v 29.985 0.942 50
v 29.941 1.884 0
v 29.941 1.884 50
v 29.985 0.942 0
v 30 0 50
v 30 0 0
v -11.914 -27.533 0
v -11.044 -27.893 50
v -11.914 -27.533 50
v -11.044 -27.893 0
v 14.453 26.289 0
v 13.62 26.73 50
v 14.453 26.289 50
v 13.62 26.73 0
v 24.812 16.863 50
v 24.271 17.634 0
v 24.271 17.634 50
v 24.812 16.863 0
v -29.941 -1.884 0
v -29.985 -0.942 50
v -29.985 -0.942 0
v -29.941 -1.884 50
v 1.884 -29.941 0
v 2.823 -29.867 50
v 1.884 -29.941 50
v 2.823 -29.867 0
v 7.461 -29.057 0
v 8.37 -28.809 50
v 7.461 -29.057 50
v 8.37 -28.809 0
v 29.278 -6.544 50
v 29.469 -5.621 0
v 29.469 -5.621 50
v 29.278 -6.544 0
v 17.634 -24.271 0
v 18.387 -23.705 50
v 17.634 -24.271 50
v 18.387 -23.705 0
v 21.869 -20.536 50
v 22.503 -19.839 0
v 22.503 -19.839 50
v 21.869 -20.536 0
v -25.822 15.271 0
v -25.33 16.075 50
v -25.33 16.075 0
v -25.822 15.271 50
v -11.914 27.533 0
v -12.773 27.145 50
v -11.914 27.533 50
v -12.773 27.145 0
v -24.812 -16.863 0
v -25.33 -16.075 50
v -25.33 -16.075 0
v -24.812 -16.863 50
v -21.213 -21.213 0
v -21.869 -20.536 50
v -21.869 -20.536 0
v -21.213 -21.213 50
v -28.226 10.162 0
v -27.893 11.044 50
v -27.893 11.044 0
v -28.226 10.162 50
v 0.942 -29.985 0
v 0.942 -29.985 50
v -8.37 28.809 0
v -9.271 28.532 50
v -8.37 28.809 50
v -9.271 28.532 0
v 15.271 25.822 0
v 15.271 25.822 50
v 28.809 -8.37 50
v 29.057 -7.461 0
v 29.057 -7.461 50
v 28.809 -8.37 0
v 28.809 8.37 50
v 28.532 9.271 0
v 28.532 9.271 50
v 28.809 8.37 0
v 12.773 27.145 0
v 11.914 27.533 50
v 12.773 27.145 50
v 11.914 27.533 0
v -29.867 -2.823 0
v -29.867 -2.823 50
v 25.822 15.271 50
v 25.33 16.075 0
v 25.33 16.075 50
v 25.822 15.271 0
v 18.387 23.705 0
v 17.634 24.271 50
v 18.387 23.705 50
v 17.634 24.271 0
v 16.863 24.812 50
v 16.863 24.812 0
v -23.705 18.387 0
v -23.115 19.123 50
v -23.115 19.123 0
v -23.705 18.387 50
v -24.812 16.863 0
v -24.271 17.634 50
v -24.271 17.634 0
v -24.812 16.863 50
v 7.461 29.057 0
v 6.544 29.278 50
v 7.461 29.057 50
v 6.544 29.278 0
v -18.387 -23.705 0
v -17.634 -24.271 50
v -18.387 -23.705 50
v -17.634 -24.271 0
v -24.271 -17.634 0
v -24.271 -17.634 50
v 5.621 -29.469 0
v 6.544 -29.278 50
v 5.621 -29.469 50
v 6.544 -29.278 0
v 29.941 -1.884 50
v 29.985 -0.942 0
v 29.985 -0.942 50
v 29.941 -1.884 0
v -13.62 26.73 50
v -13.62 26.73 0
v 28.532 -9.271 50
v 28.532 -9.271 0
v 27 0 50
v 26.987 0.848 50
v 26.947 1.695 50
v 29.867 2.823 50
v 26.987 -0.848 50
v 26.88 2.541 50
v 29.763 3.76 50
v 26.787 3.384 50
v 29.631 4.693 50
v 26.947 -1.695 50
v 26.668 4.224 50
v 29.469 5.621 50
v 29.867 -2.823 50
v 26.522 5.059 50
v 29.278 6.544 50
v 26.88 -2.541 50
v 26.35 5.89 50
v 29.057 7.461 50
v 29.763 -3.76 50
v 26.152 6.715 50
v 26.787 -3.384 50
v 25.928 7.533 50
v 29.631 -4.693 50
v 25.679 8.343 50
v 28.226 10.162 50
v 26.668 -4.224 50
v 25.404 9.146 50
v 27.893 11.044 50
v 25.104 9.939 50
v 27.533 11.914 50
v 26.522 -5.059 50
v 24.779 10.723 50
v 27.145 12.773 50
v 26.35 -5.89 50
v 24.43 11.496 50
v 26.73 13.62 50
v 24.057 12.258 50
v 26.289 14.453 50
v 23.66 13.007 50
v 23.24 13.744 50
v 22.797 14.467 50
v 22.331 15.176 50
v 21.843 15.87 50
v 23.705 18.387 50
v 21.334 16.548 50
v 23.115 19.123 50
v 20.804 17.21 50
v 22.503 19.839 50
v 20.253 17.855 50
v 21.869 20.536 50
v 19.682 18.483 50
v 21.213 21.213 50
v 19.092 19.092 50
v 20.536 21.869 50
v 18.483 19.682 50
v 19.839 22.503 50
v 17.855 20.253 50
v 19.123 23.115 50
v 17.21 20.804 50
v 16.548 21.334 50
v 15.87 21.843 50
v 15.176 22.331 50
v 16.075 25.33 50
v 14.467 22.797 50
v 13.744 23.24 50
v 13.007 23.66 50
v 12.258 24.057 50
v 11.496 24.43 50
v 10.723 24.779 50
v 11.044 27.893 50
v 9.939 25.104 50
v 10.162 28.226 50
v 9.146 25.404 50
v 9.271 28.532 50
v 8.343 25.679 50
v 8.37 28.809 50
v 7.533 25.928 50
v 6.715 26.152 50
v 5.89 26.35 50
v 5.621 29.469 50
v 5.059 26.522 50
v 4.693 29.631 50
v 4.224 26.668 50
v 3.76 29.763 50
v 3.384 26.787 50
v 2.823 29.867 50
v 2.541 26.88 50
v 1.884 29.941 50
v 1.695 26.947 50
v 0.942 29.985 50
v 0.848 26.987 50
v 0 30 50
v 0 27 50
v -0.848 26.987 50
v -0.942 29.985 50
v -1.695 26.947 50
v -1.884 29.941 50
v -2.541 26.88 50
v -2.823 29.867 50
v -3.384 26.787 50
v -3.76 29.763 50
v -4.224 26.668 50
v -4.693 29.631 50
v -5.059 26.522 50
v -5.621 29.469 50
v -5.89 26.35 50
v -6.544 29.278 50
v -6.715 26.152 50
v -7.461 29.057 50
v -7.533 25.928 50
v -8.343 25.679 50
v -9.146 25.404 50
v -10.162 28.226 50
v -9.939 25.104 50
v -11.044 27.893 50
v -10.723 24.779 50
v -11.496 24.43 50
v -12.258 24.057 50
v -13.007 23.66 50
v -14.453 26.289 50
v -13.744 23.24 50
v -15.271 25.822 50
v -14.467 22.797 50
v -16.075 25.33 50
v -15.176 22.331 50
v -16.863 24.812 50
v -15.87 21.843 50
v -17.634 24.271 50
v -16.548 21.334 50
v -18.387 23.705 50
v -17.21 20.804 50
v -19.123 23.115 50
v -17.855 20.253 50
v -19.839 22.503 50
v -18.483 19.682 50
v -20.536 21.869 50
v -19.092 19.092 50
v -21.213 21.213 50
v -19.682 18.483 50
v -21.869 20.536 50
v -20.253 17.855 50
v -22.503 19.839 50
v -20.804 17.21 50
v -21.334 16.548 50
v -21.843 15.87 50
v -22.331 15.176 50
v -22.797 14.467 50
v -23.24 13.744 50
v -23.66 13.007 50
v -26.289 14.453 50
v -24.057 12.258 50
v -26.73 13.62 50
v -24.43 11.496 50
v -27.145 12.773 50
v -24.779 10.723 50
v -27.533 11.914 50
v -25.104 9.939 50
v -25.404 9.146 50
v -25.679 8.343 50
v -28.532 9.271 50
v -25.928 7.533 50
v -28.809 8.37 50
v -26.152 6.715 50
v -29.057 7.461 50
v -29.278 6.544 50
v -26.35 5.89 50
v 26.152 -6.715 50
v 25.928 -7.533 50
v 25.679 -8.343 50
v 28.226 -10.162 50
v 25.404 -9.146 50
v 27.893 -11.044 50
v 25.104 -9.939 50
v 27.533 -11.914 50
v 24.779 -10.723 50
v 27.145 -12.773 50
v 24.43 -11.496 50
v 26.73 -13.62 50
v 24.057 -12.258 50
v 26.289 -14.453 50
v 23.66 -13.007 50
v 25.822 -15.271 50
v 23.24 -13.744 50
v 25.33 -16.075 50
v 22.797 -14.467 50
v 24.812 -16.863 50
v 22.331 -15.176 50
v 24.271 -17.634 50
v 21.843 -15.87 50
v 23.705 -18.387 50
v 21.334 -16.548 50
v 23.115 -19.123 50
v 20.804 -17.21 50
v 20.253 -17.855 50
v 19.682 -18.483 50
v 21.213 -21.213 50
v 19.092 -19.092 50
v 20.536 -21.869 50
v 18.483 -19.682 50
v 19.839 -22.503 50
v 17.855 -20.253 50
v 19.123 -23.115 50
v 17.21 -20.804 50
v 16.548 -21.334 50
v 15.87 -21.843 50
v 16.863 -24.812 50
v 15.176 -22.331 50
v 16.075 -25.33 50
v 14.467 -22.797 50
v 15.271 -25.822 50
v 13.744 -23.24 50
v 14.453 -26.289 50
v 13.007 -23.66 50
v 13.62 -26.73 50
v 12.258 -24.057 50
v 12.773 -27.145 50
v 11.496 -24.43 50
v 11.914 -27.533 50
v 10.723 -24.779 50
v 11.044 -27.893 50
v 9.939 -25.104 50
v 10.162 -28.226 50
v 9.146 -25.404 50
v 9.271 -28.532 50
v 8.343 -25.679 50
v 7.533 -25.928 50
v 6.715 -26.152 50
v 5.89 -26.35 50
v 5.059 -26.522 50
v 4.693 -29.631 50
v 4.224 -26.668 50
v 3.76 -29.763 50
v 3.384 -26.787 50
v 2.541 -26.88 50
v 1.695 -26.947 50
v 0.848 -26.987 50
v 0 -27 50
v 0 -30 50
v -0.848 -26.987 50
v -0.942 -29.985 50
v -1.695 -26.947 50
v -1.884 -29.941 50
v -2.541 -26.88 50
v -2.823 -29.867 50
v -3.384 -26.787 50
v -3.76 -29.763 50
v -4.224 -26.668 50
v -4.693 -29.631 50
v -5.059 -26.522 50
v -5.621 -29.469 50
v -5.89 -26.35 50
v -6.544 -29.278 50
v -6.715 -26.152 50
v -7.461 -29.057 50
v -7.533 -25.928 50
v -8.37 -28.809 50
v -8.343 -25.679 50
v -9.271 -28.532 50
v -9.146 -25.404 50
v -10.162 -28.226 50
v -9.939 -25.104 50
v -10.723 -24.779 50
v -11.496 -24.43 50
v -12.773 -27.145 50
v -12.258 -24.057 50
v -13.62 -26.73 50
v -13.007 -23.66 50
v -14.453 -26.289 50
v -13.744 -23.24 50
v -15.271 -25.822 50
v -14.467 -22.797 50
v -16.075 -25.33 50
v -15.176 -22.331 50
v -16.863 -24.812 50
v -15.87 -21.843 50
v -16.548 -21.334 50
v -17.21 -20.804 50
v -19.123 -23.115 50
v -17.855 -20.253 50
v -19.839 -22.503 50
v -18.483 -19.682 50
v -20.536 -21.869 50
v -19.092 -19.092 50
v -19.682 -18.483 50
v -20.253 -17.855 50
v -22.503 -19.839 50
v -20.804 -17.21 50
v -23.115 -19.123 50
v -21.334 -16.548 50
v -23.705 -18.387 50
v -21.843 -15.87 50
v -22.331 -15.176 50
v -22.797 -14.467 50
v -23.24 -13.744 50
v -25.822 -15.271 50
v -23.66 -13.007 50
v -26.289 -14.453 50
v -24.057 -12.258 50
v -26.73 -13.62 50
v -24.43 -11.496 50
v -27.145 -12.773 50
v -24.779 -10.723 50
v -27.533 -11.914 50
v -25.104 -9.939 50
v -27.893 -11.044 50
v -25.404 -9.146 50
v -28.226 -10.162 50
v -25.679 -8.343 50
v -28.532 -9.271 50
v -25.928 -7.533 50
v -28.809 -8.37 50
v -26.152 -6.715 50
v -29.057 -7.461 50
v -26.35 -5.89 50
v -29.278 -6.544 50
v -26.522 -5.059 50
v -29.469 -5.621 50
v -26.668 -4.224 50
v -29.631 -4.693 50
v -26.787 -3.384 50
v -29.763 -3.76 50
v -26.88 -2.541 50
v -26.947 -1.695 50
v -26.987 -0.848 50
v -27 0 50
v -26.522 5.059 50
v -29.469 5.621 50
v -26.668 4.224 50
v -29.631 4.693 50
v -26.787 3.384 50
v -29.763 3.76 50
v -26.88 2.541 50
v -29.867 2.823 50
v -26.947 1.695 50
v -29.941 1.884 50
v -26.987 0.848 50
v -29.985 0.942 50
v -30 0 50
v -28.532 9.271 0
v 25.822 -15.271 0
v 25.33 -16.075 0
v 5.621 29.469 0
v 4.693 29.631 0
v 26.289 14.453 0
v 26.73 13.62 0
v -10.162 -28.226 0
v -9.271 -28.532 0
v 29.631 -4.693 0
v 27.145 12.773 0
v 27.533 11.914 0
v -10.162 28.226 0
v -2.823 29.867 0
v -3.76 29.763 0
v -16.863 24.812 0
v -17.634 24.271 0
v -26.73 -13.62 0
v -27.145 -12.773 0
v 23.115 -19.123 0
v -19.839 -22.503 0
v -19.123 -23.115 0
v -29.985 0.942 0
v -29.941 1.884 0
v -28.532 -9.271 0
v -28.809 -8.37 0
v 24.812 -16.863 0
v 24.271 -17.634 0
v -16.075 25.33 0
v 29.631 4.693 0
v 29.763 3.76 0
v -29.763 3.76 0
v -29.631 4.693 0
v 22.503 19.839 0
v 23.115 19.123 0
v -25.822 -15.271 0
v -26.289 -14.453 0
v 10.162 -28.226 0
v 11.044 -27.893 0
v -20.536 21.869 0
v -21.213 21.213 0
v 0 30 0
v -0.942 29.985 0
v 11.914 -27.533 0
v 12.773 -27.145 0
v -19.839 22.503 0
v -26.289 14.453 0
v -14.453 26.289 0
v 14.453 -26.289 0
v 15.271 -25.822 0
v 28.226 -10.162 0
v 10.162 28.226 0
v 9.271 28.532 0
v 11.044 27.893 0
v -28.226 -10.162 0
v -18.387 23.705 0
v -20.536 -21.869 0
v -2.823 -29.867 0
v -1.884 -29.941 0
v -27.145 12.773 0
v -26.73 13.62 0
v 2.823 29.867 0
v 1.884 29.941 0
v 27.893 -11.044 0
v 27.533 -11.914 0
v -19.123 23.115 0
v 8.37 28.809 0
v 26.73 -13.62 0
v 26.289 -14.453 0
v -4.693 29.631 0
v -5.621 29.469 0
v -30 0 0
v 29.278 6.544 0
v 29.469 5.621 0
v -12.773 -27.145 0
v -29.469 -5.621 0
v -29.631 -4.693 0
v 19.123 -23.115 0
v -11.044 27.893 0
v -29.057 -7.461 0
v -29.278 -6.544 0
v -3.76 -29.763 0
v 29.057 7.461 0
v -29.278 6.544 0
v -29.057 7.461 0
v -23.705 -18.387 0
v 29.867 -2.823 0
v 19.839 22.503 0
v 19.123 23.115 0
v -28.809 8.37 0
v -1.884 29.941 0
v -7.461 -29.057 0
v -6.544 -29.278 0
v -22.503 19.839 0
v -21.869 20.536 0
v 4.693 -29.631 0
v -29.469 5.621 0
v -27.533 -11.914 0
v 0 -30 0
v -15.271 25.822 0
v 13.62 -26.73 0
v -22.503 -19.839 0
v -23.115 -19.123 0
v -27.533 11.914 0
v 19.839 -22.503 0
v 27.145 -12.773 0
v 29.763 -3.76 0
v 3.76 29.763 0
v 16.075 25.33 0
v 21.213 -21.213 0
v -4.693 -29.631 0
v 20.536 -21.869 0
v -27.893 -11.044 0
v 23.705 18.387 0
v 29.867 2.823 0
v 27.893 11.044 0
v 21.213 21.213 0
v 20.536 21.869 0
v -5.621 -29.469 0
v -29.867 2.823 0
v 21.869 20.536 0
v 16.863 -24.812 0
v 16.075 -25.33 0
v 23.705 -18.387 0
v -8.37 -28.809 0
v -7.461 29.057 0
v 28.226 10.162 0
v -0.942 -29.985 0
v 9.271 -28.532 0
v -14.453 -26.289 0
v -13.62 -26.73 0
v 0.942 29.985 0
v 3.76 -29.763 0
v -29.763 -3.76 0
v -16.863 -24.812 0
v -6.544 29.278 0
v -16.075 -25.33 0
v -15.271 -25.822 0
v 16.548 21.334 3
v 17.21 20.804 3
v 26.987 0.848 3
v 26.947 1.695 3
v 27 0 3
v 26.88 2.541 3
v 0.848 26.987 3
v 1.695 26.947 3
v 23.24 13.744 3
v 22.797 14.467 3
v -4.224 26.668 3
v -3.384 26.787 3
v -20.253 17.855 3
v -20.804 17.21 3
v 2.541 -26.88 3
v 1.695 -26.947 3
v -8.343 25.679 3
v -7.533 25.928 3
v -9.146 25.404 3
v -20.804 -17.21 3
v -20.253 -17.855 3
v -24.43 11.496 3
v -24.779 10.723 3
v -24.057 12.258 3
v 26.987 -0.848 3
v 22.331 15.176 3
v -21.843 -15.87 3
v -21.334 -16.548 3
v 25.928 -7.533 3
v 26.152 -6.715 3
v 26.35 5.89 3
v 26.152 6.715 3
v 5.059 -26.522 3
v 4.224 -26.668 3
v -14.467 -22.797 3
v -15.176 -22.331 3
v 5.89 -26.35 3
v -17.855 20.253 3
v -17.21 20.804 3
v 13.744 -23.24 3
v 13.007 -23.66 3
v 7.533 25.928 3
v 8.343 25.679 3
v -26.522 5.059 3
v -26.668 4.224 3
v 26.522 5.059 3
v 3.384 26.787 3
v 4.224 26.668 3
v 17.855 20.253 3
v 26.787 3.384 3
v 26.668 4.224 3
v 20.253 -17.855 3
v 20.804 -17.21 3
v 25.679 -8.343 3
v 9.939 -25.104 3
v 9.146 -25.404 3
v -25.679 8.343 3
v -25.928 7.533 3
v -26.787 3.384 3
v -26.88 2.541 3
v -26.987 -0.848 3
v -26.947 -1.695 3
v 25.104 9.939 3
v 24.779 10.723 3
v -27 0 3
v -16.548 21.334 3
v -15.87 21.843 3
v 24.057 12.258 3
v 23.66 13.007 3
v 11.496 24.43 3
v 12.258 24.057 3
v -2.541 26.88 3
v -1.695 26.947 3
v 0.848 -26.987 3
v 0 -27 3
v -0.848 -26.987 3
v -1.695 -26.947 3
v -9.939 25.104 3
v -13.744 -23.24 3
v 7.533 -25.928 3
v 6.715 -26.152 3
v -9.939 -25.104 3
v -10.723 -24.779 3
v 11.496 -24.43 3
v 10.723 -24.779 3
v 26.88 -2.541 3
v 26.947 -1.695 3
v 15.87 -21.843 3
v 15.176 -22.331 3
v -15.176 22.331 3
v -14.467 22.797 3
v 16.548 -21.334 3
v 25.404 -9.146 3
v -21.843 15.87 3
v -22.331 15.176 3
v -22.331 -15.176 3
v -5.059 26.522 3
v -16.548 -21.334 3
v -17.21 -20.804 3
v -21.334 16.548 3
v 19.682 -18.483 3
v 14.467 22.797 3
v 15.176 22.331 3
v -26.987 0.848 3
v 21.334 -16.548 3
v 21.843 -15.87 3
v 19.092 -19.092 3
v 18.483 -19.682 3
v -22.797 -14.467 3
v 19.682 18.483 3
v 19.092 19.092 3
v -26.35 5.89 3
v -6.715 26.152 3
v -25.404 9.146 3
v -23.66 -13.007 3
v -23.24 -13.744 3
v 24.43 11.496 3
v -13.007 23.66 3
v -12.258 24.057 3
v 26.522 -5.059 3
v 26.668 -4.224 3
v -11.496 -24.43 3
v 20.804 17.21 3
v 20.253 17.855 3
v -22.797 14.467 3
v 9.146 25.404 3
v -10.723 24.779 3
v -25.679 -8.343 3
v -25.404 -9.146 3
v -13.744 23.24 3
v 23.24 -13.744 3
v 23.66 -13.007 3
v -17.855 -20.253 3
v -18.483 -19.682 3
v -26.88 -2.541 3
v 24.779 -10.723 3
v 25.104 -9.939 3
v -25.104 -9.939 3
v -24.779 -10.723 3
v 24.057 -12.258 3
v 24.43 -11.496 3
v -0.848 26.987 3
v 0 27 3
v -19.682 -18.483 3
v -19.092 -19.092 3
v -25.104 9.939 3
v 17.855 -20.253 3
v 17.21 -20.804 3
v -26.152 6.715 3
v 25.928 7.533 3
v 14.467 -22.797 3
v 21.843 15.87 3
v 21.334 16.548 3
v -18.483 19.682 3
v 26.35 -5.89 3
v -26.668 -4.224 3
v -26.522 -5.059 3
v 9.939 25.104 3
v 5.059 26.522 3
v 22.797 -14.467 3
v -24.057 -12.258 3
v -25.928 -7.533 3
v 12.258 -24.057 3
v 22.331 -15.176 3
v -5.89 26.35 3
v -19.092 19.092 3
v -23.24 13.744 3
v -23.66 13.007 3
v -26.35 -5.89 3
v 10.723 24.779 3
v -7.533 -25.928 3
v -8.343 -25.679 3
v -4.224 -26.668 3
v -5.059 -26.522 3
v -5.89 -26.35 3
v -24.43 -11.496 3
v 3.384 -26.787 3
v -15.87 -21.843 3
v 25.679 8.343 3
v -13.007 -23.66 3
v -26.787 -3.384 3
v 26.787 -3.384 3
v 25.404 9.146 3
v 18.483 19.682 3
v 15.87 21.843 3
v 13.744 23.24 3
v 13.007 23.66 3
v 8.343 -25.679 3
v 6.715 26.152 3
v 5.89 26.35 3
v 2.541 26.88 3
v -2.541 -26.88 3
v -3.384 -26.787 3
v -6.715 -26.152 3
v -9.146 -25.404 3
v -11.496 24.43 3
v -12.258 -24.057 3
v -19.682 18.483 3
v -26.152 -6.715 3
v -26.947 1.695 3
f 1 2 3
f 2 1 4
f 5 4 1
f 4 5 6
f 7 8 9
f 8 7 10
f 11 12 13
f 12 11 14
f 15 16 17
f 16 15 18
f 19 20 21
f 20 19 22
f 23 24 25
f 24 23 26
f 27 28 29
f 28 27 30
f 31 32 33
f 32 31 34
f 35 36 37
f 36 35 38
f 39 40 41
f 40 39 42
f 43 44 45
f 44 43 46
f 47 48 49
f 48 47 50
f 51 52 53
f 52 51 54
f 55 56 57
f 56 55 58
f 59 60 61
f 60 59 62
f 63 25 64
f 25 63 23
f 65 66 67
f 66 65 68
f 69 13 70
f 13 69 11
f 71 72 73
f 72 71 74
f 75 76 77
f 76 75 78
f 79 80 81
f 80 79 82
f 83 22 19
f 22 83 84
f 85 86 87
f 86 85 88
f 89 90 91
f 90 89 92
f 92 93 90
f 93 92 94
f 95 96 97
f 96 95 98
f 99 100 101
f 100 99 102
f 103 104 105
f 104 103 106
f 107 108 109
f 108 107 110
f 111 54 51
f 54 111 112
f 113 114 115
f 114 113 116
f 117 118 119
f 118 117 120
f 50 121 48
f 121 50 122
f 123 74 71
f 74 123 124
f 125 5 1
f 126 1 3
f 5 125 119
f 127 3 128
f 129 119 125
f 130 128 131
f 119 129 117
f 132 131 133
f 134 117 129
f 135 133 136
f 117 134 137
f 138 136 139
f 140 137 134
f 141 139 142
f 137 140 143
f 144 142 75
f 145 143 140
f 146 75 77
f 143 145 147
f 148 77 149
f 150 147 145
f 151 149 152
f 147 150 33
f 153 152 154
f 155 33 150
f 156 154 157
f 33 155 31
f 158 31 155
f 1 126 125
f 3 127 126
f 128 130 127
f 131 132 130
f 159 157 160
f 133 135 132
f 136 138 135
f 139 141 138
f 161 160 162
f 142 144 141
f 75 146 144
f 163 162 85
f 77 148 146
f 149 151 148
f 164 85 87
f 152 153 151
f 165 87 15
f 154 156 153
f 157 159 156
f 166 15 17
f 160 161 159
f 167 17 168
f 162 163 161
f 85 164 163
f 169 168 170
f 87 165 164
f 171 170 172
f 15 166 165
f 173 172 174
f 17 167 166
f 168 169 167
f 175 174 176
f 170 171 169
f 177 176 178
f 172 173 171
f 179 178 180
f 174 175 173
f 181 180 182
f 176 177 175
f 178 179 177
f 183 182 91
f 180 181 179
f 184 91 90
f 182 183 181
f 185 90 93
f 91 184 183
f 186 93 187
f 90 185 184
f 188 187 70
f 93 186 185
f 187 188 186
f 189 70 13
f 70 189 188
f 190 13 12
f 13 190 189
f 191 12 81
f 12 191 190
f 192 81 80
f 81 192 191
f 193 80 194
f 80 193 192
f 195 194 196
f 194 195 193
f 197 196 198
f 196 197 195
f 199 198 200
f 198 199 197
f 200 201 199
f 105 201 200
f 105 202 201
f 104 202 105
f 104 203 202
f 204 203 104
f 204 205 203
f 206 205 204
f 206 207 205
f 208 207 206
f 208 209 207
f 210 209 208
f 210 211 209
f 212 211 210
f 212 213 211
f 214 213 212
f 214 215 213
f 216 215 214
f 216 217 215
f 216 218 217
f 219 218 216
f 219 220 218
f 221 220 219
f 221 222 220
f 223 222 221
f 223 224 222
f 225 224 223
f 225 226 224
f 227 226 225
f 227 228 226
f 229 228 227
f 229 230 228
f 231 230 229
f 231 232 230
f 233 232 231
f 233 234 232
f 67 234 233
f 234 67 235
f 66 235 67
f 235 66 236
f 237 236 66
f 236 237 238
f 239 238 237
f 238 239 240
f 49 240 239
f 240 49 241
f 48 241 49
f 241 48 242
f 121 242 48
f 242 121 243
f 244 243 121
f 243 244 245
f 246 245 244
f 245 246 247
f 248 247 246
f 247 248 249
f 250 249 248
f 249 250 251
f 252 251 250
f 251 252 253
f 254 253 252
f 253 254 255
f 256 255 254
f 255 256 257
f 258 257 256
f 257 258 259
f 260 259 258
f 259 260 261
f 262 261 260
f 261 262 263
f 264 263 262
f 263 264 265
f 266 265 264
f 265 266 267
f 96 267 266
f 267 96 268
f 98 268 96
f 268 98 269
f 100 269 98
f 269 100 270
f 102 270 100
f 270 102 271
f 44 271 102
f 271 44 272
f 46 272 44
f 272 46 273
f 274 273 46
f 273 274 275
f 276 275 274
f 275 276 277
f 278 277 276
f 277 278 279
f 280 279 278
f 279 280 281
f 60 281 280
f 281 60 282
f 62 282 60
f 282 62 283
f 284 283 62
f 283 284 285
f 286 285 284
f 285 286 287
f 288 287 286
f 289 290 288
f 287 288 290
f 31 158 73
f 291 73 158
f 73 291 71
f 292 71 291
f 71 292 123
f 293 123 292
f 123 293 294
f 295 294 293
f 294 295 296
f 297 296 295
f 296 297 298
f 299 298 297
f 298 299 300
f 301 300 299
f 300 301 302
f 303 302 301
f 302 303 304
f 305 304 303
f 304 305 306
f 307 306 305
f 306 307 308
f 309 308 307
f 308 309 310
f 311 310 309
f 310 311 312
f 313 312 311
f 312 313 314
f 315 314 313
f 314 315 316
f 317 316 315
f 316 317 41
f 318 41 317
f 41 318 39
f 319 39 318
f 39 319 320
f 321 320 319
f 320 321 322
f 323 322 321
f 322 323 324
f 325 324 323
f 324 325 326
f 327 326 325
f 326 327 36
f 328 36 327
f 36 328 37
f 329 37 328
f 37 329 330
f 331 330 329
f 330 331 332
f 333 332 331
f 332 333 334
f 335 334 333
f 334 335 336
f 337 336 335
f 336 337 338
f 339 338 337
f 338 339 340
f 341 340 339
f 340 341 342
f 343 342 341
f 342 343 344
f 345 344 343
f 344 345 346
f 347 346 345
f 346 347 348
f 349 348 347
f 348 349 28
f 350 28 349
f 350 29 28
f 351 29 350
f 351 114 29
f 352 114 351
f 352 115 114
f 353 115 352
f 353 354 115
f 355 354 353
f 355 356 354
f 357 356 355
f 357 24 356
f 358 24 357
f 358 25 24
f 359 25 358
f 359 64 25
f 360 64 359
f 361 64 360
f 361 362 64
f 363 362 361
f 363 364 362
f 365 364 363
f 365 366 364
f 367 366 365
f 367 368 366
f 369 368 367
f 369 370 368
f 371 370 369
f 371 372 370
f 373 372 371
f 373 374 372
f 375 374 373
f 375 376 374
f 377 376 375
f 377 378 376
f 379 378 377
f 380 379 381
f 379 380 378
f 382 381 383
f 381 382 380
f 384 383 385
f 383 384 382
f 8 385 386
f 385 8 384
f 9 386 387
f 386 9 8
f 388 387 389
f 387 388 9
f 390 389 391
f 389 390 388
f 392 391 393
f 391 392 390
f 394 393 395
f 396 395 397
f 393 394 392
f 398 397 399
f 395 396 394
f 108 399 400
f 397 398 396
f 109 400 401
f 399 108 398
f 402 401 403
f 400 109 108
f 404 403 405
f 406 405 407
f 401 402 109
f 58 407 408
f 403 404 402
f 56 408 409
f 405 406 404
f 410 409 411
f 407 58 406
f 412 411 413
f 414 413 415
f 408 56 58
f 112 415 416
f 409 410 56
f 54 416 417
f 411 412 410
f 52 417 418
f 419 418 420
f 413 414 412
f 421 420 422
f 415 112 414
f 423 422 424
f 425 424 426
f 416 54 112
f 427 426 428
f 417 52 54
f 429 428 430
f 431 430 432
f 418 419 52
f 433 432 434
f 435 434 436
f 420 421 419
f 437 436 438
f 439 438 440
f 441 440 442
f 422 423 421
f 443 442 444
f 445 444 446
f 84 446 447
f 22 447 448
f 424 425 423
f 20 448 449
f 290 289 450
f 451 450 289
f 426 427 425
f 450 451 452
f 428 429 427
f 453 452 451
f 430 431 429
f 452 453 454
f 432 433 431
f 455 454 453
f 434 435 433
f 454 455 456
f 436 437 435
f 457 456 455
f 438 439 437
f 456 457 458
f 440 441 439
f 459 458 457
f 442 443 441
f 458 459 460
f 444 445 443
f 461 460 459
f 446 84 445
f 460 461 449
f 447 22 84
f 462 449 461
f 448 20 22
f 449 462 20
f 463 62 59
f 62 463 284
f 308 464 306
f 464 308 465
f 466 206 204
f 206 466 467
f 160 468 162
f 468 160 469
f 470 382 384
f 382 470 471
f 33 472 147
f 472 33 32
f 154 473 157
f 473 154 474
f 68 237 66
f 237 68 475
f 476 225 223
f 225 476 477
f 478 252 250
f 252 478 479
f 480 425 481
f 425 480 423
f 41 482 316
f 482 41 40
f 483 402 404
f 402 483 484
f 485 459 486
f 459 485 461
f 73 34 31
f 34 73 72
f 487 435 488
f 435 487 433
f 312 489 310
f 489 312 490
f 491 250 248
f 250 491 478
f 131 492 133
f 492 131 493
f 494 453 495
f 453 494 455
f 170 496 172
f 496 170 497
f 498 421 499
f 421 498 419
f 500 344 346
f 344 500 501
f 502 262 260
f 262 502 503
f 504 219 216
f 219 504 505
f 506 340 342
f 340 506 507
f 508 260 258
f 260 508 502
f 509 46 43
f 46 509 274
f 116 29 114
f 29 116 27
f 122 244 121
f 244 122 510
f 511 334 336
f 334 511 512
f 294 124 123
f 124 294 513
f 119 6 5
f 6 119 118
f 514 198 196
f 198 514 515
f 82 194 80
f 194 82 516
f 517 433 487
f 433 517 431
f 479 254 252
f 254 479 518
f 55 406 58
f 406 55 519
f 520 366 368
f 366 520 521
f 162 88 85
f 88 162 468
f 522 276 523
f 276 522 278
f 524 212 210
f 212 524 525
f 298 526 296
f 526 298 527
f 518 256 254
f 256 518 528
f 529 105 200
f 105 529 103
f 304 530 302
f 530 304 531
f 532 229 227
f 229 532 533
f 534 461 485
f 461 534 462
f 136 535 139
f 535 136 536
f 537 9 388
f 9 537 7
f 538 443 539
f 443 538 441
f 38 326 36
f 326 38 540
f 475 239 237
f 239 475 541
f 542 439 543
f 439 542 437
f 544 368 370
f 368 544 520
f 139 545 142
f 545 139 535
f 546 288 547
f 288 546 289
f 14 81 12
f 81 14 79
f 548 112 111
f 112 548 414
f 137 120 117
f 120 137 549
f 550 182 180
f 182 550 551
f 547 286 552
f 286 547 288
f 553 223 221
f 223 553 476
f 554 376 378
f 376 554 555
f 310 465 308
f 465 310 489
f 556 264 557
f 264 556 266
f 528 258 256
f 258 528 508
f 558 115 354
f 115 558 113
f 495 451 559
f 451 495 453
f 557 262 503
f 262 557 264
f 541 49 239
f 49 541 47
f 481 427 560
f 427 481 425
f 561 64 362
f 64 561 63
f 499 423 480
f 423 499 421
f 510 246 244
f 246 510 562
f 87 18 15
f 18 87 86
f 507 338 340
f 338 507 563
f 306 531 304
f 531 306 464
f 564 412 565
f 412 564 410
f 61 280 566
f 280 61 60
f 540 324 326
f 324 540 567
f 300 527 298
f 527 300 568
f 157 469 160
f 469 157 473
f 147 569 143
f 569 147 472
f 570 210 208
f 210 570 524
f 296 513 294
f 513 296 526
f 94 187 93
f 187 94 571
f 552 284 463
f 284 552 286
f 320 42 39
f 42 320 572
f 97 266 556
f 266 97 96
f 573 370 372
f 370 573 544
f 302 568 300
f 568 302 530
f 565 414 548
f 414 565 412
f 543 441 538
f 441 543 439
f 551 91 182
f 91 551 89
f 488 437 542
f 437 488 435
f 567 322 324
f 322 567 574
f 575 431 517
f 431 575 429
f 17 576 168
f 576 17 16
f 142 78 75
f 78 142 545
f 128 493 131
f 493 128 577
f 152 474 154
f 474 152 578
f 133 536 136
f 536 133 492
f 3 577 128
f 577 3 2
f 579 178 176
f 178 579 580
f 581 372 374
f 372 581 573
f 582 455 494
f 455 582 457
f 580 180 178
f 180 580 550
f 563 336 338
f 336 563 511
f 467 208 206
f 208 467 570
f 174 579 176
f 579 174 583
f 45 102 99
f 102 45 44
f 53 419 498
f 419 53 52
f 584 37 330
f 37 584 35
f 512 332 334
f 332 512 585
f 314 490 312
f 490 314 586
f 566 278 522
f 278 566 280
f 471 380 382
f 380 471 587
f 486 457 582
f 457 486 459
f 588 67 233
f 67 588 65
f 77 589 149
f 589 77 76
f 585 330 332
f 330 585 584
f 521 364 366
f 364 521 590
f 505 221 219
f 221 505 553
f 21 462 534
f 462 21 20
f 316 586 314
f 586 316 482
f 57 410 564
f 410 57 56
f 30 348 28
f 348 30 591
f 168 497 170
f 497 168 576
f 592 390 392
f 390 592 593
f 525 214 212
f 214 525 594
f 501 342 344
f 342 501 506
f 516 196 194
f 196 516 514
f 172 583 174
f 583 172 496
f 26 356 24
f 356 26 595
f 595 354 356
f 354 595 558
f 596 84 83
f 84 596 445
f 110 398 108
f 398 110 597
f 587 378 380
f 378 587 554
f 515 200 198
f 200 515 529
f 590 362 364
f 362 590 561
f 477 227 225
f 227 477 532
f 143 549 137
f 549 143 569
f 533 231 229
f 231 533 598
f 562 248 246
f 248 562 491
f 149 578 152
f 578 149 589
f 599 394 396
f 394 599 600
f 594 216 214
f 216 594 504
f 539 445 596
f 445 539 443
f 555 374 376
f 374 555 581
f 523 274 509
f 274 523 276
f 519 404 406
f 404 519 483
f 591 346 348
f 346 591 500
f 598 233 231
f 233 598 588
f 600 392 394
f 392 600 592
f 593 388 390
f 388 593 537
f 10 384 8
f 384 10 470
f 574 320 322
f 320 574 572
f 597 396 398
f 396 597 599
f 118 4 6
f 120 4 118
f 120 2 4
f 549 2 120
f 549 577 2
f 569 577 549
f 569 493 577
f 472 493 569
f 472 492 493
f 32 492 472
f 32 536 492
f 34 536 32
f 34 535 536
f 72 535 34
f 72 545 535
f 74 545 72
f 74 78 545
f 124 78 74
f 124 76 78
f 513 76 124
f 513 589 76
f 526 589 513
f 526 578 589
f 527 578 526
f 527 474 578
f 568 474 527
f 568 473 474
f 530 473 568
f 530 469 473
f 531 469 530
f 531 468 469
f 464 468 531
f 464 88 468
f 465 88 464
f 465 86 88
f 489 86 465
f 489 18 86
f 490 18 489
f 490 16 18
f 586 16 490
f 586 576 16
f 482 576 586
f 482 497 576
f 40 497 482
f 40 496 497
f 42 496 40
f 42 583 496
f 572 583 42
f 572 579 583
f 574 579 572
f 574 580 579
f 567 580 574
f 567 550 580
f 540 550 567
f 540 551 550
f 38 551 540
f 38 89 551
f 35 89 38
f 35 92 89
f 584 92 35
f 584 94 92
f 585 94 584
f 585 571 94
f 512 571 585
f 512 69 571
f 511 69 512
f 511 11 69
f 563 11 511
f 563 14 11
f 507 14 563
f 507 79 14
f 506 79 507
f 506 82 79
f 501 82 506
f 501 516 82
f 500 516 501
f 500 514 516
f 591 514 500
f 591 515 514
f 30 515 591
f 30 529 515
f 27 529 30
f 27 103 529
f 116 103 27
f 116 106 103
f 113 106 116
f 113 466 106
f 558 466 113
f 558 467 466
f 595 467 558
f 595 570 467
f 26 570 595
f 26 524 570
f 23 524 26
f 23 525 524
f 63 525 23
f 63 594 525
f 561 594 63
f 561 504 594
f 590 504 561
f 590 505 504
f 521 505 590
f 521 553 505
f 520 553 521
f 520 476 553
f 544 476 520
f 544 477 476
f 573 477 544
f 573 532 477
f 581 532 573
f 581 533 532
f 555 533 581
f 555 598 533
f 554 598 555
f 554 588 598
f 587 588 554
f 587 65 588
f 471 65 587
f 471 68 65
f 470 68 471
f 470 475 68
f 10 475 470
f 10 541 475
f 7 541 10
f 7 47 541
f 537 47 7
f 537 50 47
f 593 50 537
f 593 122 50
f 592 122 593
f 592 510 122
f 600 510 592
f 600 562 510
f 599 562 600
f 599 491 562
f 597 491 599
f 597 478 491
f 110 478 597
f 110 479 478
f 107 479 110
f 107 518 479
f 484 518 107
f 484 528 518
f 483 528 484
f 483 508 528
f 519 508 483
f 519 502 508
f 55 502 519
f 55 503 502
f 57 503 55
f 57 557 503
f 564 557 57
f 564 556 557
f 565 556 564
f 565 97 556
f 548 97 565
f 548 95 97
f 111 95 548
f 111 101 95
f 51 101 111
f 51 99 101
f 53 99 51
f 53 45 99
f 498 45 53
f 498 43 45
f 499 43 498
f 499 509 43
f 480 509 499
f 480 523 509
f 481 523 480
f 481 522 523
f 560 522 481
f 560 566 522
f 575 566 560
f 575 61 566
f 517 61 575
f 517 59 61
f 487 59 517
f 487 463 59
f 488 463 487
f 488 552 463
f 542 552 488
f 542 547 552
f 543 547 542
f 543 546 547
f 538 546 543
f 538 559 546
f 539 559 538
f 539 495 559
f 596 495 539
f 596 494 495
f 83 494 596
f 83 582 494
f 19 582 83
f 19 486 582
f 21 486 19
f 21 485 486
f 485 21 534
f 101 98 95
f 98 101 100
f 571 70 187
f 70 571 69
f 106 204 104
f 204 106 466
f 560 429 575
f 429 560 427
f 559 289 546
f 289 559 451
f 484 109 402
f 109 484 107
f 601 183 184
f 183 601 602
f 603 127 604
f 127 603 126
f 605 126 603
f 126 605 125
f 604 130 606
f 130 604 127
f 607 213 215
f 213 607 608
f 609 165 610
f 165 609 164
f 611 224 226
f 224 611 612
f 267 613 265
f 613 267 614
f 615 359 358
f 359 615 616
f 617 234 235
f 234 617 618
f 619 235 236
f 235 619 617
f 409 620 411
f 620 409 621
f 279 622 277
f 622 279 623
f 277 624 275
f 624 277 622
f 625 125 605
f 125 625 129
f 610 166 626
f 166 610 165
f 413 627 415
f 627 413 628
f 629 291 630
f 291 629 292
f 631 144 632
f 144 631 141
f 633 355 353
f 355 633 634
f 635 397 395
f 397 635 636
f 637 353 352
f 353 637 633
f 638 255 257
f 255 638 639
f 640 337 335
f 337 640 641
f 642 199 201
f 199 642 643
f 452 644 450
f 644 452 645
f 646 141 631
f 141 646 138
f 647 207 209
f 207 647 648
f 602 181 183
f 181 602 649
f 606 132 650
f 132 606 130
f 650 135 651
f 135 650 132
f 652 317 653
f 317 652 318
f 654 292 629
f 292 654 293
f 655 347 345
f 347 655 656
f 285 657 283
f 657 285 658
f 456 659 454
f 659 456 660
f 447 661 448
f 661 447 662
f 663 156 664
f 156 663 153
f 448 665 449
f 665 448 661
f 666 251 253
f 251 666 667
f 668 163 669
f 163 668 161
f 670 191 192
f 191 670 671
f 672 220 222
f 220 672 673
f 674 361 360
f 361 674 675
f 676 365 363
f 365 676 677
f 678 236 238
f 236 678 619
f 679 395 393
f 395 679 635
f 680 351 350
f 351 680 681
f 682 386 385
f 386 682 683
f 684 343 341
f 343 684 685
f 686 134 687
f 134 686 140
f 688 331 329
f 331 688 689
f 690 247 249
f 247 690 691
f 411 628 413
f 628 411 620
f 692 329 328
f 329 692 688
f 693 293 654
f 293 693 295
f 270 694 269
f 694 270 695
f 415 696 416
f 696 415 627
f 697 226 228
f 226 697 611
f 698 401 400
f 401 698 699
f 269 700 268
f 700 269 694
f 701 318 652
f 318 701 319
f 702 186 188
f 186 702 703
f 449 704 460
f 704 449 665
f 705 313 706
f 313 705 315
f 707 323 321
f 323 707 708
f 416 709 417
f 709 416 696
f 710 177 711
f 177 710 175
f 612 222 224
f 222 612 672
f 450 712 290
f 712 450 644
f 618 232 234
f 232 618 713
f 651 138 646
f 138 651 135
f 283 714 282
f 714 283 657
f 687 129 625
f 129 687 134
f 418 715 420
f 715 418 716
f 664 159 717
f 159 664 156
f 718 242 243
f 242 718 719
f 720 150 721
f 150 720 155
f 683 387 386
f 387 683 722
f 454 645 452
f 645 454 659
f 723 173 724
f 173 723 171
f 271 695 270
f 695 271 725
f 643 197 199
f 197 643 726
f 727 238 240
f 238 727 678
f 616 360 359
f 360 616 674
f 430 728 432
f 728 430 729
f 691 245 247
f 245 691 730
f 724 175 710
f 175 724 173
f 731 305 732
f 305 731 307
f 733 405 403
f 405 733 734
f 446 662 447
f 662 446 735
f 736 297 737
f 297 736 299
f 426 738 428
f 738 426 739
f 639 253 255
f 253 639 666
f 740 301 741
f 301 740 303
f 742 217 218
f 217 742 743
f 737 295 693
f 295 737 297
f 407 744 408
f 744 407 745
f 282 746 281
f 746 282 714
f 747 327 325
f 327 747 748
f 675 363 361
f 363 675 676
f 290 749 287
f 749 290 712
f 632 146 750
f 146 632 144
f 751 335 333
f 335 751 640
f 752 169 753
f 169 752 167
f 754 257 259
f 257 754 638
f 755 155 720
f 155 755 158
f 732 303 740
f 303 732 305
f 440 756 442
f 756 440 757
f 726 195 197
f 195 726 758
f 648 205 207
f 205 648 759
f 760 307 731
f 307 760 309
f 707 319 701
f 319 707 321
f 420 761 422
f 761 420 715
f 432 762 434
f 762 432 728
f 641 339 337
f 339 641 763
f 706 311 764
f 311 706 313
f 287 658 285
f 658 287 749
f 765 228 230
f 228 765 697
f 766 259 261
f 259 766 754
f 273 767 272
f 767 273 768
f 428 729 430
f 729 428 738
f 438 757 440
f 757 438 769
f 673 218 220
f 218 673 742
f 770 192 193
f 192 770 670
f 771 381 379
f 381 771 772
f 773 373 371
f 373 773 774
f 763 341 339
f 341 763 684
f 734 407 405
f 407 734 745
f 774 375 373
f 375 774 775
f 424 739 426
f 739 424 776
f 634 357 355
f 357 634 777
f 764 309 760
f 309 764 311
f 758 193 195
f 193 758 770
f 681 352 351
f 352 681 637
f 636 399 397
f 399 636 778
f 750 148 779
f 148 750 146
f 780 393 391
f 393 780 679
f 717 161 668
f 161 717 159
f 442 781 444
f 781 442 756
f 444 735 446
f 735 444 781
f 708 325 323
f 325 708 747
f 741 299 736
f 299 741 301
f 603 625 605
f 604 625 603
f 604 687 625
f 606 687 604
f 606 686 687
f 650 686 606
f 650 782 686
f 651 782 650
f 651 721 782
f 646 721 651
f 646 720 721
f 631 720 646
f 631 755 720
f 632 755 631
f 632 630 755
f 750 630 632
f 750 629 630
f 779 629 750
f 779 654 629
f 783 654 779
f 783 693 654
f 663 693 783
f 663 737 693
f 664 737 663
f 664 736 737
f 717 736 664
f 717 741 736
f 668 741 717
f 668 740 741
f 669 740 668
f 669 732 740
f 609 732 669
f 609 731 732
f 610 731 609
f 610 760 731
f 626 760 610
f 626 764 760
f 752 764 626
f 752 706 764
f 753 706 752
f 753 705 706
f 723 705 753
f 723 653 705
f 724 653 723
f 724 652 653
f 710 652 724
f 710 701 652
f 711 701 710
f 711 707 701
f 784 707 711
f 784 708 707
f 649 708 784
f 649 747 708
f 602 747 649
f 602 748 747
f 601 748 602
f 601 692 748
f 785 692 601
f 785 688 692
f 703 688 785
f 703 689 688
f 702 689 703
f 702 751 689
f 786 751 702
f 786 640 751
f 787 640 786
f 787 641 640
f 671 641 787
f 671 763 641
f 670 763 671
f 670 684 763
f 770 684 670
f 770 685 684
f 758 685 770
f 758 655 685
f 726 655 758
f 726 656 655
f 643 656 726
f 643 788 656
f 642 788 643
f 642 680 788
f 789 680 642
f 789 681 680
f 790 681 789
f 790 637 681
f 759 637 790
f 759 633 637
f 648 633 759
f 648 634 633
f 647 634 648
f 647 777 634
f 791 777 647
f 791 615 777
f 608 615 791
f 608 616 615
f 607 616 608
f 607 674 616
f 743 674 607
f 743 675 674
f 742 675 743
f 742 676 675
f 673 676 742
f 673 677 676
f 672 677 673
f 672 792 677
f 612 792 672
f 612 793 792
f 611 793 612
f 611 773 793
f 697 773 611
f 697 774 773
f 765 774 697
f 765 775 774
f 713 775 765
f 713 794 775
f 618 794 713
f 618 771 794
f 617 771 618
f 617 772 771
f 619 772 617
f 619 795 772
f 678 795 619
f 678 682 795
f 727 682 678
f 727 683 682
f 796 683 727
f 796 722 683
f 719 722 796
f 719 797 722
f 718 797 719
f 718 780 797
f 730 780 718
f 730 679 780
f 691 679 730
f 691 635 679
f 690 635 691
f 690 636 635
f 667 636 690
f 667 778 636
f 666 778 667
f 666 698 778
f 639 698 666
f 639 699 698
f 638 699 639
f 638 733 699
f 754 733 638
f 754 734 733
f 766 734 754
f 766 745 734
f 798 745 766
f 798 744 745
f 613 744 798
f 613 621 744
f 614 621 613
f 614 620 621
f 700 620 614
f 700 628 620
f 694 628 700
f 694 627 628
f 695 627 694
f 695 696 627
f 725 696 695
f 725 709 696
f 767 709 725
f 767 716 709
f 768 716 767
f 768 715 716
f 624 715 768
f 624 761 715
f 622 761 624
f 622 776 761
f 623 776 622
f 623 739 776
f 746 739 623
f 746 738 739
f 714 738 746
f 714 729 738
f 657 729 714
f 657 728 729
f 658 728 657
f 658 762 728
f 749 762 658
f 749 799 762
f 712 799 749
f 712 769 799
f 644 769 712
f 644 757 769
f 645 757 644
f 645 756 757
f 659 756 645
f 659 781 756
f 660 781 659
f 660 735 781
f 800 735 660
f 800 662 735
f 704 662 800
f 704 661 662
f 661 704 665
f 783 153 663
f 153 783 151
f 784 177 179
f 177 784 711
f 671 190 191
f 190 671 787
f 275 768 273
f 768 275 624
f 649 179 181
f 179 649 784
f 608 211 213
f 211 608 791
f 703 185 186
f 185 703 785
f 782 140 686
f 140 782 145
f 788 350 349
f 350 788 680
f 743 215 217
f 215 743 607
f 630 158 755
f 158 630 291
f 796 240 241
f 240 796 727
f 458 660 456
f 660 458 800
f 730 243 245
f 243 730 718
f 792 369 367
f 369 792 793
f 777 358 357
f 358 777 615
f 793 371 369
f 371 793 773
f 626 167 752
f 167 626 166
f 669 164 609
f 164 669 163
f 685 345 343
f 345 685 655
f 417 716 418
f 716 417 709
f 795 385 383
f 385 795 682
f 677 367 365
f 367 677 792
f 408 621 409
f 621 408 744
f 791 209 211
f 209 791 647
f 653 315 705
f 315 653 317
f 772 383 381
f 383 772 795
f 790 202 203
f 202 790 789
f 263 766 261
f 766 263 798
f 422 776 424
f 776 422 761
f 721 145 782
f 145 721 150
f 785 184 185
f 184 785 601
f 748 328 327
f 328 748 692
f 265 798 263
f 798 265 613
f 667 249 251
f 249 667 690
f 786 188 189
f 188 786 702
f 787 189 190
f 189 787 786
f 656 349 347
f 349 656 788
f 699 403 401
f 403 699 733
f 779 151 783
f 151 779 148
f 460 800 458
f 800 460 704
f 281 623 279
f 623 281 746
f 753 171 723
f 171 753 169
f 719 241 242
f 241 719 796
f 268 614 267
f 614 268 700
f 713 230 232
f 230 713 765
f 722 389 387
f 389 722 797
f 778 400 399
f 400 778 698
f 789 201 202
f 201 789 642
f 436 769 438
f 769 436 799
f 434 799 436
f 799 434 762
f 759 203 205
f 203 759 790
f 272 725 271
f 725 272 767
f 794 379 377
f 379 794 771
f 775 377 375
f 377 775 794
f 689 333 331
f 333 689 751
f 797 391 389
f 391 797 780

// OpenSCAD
$fn = 200;

difference() {
	cylinder(h = 50, r1 = 30, r2 = 30);
	color(alpha = 1.0, c = "black") {
		translate(v = [0, 0, 3]) {
			cylinder(h = 47, r1 = 27, r2 = 27);
		}
	}
}
